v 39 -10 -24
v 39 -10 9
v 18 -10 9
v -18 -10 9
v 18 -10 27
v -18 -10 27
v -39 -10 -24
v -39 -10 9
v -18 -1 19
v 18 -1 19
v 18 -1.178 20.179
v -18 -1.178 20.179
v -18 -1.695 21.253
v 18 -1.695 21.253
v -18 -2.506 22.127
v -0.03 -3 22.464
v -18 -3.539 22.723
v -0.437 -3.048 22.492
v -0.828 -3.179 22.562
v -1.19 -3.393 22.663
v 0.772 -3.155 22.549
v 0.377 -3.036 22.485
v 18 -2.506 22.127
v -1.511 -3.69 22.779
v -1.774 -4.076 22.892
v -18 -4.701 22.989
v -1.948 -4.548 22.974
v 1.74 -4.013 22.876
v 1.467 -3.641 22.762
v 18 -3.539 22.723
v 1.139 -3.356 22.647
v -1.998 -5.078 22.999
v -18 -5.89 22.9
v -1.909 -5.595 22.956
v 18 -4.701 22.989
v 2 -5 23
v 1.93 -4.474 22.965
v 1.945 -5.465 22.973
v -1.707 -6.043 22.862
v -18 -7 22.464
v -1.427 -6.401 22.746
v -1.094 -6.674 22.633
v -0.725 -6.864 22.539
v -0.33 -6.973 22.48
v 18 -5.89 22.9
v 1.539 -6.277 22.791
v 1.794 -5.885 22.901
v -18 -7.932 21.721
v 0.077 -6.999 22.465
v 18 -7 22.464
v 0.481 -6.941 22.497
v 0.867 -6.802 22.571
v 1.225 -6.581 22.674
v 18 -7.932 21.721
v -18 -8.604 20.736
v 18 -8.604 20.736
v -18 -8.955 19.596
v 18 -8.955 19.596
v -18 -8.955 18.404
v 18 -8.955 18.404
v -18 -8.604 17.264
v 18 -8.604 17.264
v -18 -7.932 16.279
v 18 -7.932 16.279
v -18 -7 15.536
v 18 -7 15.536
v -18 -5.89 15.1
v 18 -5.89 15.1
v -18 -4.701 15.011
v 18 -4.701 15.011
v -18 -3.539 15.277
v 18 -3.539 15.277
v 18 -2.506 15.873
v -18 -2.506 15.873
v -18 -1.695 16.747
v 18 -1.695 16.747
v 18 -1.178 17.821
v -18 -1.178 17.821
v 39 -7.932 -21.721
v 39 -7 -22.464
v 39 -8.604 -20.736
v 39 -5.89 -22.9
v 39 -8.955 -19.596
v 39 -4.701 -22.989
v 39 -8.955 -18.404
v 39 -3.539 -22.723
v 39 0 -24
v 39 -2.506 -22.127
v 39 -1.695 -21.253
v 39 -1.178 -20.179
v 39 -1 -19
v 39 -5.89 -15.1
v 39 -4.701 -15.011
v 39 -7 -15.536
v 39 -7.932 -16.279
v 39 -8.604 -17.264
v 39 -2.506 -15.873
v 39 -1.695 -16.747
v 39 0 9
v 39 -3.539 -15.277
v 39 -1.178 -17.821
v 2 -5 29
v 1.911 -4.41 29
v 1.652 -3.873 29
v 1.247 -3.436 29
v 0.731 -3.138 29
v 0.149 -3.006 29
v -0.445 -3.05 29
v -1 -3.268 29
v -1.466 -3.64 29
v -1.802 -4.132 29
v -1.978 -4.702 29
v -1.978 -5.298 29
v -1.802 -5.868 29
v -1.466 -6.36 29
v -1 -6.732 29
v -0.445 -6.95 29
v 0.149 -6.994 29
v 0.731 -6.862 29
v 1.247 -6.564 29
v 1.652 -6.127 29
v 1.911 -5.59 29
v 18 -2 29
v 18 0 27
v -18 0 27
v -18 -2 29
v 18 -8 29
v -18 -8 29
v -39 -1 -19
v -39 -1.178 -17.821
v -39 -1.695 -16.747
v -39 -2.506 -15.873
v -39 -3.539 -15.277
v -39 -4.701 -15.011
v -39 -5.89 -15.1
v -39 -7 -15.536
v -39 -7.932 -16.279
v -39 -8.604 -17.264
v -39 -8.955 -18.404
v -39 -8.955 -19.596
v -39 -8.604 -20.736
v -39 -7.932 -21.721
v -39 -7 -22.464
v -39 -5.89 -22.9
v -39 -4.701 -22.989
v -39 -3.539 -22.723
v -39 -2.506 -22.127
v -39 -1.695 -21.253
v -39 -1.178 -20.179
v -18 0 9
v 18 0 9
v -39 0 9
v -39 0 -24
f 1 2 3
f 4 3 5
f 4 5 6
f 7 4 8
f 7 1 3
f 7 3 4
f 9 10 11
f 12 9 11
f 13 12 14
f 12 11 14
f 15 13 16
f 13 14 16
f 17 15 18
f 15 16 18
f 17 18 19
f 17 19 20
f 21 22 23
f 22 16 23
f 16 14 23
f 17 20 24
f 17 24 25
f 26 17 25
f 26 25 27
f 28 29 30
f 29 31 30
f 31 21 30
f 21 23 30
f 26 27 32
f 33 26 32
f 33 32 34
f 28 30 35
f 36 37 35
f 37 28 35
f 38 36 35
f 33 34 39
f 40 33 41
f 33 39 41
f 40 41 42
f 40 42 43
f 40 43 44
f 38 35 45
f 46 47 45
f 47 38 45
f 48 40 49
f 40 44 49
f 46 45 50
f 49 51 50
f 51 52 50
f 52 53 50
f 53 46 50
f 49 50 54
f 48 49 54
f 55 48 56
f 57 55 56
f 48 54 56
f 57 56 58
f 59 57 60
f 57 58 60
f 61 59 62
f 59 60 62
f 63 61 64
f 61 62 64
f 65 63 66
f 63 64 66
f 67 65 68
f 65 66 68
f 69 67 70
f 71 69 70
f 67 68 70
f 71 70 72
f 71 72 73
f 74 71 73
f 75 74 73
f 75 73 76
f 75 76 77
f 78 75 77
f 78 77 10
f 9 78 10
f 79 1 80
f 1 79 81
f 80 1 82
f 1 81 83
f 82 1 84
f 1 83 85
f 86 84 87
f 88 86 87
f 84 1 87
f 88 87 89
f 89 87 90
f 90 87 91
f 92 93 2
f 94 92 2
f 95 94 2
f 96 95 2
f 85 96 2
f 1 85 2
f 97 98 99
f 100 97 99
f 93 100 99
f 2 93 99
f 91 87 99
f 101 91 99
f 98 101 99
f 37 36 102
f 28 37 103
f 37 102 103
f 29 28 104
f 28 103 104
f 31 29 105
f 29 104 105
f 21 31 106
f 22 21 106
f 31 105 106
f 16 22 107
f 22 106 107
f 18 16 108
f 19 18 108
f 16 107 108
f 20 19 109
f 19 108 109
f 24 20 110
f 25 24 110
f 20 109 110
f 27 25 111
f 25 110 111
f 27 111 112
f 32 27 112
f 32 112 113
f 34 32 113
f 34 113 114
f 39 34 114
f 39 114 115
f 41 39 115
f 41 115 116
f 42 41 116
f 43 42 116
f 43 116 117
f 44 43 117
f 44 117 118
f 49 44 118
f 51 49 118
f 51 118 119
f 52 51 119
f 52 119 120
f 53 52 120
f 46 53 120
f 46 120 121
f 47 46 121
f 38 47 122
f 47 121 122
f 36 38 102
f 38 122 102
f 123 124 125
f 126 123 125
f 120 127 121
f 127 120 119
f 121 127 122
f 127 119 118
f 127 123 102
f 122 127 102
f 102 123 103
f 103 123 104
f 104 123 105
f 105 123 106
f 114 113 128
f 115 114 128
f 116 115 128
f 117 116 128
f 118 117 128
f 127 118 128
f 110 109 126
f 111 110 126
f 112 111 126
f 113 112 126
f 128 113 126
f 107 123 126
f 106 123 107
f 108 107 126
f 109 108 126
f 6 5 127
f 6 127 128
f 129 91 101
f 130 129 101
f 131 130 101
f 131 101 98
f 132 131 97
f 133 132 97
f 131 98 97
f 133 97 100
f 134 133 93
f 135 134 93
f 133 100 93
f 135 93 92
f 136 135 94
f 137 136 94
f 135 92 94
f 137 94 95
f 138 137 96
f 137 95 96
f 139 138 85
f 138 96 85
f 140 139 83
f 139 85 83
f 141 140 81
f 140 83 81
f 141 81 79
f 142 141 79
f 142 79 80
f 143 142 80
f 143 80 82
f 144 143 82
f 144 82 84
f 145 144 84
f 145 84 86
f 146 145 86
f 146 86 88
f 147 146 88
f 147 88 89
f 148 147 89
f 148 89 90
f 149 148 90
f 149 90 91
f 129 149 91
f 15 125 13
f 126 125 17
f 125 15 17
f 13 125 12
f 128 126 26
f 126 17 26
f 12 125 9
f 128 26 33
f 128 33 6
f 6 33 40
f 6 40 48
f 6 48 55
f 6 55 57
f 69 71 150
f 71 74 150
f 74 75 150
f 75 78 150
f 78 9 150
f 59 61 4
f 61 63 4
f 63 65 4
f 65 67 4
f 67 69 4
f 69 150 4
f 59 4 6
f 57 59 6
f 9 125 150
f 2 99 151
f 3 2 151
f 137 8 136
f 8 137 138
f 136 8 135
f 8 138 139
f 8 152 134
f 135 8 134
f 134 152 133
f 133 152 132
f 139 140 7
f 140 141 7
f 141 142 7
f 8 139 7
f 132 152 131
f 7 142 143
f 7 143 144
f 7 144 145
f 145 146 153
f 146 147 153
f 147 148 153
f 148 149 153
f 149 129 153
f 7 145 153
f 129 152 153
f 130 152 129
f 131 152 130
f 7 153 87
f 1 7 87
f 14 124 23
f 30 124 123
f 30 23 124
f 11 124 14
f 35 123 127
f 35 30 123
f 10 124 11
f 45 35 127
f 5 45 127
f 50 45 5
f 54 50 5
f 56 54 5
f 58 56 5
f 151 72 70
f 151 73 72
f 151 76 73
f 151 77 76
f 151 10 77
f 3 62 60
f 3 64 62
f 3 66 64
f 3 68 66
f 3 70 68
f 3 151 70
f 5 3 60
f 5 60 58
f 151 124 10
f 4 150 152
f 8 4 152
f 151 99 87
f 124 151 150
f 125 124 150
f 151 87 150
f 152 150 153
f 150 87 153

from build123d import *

# Parameters (mm, degrees)
F1_DEPTH  = 10
F2_R      = 4
F3_DEPTH  = 38
F4_R      = 4
F5_DEPTH  = 70
F8_DEPTH  = 10
F9_R      = 4
F10_DEPTH = 40
F11_R     = 4
F12_DEPTH = 100
F13_DEPTH = 5
F14_R     = 2
F15_DEPTH = 10
F16_SIZE  = 2


with BuildPart() as f1:
    # F0 (on Front) → F1 (new body)
    with BuildSketch(Plane.XZ):
        Polygon((19, 24), (-19, 24), (-19, 9), (-35, 9), (-35, -24), (35, -24), (35, 9), (19, 9), align=None)
    extrude(amount=F1_DEPTH)

    # F2 (on face) → F3 (cut)
    with BuildSketch(Plane.YZ.offset(19)):
        with Locations((-5, 19)):
            Circle(F2_R)
    extrude(amount=-F3_DEPTH, mode=Mode.SUBTRACT)

    # F4 (on face) → F5 (cut)
    with BuildSketch(Plane.YZ.offset(35)):
        with Locations((-5, -19)):
            Circle(F4_R)
    extrude(amount=-F5_DEPTH, mode=Mode.SUBTRACT)


with BuildPart() as f8:
    # F7 (on Front) → F8 (new body)
    with BuildSketch(Plane.XZ):
        Polygon((18, 24), (-18, 24), (-18, 9), (-39, 9), (-39, -24), (39, -24), (39, 9), (18, 9), align=None)
    extrude(amount=F8_DEPTH)

    # F9 (on face) → F10 (cut)
    with BuildSketch(Plane.YZ.offset(18)):
        with Locations((-5, 19)):
            Circle(F9_R)
    extrude(amount=-F10_DEPTH, mode=Mode.SUBTRACT)

    # F11 (on face) → F12 (cut)
    with BuildSketch(Plane.YZ.offset(39)):
        with Locations((-5, -19)):
            Circle(F11_R)
    extrude(amount=-F12_DEPTH, mode=Mode.SUBTRACT)

    # F13 (add): a face of the model
    f13_faces = [f8.faces().sort_by_distance(p)[0] for p in [
        (0, -5, 24),
    ]]
    extrude(f13_faces, amount=F13_DEPTH)

    # F14 (on face) → F15 (cut)
    with BuildSketch(Plane.XY.offset(29)):
        with Locations((0, -5)):
            Circle(F14_R)
    extrude(amount=-F15_DEPTH, mode=Mode.SUBTRACT)

    # F16
    f16_edges = [f8.edges().sort_by_distance(p)[0] for p in [
        (0, -10, 29),
        (0, 0, 29),
    ]]
    chamfer(f16_edges, length=F16_SIZE)


solid = f8.part
